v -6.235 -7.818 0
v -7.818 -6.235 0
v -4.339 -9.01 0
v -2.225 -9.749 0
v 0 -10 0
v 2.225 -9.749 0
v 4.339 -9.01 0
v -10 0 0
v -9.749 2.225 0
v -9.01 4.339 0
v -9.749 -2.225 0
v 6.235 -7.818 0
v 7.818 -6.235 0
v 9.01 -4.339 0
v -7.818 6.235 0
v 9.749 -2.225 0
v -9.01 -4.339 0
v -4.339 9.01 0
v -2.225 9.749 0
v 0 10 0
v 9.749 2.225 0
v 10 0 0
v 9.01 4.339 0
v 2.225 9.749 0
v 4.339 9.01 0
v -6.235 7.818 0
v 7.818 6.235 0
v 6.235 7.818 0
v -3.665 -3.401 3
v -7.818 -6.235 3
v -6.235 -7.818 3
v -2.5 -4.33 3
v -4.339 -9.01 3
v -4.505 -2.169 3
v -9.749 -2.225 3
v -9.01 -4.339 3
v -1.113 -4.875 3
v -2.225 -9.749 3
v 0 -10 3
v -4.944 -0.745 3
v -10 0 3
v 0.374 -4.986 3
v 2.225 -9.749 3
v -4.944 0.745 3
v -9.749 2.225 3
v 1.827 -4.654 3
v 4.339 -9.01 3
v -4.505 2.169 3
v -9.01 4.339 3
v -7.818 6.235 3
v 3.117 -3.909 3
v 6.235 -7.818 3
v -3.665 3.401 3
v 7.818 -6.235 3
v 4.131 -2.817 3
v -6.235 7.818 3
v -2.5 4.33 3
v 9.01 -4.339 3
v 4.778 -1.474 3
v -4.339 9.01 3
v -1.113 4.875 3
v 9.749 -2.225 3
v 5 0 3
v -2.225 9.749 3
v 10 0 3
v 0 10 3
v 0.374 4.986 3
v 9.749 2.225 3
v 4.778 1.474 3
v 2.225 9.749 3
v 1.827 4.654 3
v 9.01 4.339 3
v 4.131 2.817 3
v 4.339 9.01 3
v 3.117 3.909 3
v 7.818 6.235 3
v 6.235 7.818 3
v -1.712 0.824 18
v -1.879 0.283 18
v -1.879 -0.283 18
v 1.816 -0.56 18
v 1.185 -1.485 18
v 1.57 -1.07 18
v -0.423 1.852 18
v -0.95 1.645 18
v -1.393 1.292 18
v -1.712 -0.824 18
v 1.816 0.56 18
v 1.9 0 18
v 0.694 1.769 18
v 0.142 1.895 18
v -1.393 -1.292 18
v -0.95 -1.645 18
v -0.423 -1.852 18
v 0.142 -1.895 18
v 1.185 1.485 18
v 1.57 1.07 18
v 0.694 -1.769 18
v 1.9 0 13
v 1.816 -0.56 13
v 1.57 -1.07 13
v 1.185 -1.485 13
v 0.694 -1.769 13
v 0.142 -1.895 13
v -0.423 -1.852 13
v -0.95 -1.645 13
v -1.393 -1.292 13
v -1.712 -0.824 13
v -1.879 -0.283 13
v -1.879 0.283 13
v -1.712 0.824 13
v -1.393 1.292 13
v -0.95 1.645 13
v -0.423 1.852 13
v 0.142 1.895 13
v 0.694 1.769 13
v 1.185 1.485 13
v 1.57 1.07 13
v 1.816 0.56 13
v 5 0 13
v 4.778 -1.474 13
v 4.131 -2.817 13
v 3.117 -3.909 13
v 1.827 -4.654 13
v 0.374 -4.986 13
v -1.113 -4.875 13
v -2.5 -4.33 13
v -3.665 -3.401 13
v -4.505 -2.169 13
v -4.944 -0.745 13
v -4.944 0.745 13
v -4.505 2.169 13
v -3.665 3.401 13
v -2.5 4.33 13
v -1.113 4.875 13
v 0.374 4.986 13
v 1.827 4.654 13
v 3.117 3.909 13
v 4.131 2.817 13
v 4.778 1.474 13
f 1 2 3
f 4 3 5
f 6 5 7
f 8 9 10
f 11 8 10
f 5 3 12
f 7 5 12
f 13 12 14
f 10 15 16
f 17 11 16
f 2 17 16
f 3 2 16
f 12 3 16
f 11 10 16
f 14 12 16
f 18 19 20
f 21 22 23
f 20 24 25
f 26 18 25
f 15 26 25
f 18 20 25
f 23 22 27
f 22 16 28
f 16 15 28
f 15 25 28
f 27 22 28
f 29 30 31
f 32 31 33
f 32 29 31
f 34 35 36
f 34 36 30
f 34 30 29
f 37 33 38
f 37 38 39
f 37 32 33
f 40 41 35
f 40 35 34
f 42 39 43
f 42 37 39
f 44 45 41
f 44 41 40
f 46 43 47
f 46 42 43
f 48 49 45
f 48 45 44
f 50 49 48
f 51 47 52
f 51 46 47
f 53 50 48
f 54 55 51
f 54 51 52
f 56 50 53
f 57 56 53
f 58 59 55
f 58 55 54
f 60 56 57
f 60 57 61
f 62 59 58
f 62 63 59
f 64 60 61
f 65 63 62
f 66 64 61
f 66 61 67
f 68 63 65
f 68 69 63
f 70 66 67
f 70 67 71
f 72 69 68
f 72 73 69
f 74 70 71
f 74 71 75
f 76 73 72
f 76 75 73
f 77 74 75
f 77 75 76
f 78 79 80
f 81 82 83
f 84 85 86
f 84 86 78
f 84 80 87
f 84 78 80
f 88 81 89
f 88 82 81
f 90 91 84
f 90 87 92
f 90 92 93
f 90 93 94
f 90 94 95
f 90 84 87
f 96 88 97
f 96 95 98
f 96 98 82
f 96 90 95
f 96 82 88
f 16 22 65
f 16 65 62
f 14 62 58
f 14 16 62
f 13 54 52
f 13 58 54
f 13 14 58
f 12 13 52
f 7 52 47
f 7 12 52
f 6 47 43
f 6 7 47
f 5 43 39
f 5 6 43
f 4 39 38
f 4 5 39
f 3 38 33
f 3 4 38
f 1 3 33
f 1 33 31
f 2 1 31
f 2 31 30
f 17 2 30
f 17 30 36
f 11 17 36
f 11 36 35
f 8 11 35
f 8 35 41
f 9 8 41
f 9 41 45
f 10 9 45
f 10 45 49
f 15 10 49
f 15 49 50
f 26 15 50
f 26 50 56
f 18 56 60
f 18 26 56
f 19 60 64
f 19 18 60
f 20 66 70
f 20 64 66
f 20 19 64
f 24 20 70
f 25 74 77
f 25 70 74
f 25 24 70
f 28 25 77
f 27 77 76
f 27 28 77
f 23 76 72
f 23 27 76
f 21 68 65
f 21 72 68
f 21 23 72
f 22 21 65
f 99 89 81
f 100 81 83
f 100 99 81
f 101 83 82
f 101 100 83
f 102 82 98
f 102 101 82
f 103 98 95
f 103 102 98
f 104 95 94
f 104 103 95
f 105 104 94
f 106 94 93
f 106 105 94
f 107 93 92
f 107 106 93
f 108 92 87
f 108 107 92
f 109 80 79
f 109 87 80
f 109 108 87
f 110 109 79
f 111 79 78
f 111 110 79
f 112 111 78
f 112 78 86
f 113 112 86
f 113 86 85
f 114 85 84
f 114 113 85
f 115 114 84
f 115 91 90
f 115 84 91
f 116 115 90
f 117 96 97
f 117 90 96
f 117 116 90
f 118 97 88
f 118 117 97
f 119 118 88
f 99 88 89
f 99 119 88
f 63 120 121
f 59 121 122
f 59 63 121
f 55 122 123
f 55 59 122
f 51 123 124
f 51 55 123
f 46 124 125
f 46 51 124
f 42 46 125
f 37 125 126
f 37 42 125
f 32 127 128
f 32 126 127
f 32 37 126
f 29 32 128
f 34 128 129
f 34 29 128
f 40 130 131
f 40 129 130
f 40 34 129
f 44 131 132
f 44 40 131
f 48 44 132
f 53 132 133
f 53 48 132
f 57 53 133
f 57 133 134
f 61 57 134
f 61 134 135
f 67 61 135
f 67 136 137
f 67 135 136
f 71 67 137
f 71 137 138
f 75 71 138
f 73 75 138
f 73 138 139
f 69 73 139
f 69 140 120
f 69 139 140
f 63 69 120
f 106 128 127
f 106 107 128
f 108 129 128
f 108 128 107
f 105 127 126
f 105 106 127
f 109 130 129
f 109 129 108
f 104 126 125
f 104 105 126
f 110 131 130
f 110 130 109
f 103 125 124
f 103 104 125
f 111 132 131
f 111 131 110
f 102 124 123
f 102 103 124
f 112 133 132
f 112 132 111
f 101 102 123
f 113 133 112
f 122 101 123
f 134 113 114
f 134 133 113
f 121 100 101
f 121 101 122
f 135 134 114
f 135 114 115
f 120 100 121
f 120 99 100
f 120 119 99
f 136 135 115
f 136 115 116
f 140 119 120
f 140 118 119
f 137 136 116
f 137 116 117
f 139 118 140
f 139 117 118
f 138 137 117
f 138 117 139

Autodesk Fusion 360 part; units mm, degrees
sketch "Sketch1" plane through (0, 0, 0) normal (0, 0, 1) x (1, 0, 0)
  circle A0 centre (0, 0) radius 10
  circle A1 centre (0, 0) radius 5
  circle A2 centre (0, 0) radius 1.9
  dimension "d1" = 20
  dimension "d2" = 10
  dimension "d3" = 3.8
extrude "Extrude1" add sketch "Sketch1" along normal blind 3 contours A0 | A1 | A2
extrude "Extrude2" add sketch "Sketch1" along normal blind 13 contours A1 | A2
extrude "Extrude3" add sketch "Sketch1" along normal blind 18 contours A2
